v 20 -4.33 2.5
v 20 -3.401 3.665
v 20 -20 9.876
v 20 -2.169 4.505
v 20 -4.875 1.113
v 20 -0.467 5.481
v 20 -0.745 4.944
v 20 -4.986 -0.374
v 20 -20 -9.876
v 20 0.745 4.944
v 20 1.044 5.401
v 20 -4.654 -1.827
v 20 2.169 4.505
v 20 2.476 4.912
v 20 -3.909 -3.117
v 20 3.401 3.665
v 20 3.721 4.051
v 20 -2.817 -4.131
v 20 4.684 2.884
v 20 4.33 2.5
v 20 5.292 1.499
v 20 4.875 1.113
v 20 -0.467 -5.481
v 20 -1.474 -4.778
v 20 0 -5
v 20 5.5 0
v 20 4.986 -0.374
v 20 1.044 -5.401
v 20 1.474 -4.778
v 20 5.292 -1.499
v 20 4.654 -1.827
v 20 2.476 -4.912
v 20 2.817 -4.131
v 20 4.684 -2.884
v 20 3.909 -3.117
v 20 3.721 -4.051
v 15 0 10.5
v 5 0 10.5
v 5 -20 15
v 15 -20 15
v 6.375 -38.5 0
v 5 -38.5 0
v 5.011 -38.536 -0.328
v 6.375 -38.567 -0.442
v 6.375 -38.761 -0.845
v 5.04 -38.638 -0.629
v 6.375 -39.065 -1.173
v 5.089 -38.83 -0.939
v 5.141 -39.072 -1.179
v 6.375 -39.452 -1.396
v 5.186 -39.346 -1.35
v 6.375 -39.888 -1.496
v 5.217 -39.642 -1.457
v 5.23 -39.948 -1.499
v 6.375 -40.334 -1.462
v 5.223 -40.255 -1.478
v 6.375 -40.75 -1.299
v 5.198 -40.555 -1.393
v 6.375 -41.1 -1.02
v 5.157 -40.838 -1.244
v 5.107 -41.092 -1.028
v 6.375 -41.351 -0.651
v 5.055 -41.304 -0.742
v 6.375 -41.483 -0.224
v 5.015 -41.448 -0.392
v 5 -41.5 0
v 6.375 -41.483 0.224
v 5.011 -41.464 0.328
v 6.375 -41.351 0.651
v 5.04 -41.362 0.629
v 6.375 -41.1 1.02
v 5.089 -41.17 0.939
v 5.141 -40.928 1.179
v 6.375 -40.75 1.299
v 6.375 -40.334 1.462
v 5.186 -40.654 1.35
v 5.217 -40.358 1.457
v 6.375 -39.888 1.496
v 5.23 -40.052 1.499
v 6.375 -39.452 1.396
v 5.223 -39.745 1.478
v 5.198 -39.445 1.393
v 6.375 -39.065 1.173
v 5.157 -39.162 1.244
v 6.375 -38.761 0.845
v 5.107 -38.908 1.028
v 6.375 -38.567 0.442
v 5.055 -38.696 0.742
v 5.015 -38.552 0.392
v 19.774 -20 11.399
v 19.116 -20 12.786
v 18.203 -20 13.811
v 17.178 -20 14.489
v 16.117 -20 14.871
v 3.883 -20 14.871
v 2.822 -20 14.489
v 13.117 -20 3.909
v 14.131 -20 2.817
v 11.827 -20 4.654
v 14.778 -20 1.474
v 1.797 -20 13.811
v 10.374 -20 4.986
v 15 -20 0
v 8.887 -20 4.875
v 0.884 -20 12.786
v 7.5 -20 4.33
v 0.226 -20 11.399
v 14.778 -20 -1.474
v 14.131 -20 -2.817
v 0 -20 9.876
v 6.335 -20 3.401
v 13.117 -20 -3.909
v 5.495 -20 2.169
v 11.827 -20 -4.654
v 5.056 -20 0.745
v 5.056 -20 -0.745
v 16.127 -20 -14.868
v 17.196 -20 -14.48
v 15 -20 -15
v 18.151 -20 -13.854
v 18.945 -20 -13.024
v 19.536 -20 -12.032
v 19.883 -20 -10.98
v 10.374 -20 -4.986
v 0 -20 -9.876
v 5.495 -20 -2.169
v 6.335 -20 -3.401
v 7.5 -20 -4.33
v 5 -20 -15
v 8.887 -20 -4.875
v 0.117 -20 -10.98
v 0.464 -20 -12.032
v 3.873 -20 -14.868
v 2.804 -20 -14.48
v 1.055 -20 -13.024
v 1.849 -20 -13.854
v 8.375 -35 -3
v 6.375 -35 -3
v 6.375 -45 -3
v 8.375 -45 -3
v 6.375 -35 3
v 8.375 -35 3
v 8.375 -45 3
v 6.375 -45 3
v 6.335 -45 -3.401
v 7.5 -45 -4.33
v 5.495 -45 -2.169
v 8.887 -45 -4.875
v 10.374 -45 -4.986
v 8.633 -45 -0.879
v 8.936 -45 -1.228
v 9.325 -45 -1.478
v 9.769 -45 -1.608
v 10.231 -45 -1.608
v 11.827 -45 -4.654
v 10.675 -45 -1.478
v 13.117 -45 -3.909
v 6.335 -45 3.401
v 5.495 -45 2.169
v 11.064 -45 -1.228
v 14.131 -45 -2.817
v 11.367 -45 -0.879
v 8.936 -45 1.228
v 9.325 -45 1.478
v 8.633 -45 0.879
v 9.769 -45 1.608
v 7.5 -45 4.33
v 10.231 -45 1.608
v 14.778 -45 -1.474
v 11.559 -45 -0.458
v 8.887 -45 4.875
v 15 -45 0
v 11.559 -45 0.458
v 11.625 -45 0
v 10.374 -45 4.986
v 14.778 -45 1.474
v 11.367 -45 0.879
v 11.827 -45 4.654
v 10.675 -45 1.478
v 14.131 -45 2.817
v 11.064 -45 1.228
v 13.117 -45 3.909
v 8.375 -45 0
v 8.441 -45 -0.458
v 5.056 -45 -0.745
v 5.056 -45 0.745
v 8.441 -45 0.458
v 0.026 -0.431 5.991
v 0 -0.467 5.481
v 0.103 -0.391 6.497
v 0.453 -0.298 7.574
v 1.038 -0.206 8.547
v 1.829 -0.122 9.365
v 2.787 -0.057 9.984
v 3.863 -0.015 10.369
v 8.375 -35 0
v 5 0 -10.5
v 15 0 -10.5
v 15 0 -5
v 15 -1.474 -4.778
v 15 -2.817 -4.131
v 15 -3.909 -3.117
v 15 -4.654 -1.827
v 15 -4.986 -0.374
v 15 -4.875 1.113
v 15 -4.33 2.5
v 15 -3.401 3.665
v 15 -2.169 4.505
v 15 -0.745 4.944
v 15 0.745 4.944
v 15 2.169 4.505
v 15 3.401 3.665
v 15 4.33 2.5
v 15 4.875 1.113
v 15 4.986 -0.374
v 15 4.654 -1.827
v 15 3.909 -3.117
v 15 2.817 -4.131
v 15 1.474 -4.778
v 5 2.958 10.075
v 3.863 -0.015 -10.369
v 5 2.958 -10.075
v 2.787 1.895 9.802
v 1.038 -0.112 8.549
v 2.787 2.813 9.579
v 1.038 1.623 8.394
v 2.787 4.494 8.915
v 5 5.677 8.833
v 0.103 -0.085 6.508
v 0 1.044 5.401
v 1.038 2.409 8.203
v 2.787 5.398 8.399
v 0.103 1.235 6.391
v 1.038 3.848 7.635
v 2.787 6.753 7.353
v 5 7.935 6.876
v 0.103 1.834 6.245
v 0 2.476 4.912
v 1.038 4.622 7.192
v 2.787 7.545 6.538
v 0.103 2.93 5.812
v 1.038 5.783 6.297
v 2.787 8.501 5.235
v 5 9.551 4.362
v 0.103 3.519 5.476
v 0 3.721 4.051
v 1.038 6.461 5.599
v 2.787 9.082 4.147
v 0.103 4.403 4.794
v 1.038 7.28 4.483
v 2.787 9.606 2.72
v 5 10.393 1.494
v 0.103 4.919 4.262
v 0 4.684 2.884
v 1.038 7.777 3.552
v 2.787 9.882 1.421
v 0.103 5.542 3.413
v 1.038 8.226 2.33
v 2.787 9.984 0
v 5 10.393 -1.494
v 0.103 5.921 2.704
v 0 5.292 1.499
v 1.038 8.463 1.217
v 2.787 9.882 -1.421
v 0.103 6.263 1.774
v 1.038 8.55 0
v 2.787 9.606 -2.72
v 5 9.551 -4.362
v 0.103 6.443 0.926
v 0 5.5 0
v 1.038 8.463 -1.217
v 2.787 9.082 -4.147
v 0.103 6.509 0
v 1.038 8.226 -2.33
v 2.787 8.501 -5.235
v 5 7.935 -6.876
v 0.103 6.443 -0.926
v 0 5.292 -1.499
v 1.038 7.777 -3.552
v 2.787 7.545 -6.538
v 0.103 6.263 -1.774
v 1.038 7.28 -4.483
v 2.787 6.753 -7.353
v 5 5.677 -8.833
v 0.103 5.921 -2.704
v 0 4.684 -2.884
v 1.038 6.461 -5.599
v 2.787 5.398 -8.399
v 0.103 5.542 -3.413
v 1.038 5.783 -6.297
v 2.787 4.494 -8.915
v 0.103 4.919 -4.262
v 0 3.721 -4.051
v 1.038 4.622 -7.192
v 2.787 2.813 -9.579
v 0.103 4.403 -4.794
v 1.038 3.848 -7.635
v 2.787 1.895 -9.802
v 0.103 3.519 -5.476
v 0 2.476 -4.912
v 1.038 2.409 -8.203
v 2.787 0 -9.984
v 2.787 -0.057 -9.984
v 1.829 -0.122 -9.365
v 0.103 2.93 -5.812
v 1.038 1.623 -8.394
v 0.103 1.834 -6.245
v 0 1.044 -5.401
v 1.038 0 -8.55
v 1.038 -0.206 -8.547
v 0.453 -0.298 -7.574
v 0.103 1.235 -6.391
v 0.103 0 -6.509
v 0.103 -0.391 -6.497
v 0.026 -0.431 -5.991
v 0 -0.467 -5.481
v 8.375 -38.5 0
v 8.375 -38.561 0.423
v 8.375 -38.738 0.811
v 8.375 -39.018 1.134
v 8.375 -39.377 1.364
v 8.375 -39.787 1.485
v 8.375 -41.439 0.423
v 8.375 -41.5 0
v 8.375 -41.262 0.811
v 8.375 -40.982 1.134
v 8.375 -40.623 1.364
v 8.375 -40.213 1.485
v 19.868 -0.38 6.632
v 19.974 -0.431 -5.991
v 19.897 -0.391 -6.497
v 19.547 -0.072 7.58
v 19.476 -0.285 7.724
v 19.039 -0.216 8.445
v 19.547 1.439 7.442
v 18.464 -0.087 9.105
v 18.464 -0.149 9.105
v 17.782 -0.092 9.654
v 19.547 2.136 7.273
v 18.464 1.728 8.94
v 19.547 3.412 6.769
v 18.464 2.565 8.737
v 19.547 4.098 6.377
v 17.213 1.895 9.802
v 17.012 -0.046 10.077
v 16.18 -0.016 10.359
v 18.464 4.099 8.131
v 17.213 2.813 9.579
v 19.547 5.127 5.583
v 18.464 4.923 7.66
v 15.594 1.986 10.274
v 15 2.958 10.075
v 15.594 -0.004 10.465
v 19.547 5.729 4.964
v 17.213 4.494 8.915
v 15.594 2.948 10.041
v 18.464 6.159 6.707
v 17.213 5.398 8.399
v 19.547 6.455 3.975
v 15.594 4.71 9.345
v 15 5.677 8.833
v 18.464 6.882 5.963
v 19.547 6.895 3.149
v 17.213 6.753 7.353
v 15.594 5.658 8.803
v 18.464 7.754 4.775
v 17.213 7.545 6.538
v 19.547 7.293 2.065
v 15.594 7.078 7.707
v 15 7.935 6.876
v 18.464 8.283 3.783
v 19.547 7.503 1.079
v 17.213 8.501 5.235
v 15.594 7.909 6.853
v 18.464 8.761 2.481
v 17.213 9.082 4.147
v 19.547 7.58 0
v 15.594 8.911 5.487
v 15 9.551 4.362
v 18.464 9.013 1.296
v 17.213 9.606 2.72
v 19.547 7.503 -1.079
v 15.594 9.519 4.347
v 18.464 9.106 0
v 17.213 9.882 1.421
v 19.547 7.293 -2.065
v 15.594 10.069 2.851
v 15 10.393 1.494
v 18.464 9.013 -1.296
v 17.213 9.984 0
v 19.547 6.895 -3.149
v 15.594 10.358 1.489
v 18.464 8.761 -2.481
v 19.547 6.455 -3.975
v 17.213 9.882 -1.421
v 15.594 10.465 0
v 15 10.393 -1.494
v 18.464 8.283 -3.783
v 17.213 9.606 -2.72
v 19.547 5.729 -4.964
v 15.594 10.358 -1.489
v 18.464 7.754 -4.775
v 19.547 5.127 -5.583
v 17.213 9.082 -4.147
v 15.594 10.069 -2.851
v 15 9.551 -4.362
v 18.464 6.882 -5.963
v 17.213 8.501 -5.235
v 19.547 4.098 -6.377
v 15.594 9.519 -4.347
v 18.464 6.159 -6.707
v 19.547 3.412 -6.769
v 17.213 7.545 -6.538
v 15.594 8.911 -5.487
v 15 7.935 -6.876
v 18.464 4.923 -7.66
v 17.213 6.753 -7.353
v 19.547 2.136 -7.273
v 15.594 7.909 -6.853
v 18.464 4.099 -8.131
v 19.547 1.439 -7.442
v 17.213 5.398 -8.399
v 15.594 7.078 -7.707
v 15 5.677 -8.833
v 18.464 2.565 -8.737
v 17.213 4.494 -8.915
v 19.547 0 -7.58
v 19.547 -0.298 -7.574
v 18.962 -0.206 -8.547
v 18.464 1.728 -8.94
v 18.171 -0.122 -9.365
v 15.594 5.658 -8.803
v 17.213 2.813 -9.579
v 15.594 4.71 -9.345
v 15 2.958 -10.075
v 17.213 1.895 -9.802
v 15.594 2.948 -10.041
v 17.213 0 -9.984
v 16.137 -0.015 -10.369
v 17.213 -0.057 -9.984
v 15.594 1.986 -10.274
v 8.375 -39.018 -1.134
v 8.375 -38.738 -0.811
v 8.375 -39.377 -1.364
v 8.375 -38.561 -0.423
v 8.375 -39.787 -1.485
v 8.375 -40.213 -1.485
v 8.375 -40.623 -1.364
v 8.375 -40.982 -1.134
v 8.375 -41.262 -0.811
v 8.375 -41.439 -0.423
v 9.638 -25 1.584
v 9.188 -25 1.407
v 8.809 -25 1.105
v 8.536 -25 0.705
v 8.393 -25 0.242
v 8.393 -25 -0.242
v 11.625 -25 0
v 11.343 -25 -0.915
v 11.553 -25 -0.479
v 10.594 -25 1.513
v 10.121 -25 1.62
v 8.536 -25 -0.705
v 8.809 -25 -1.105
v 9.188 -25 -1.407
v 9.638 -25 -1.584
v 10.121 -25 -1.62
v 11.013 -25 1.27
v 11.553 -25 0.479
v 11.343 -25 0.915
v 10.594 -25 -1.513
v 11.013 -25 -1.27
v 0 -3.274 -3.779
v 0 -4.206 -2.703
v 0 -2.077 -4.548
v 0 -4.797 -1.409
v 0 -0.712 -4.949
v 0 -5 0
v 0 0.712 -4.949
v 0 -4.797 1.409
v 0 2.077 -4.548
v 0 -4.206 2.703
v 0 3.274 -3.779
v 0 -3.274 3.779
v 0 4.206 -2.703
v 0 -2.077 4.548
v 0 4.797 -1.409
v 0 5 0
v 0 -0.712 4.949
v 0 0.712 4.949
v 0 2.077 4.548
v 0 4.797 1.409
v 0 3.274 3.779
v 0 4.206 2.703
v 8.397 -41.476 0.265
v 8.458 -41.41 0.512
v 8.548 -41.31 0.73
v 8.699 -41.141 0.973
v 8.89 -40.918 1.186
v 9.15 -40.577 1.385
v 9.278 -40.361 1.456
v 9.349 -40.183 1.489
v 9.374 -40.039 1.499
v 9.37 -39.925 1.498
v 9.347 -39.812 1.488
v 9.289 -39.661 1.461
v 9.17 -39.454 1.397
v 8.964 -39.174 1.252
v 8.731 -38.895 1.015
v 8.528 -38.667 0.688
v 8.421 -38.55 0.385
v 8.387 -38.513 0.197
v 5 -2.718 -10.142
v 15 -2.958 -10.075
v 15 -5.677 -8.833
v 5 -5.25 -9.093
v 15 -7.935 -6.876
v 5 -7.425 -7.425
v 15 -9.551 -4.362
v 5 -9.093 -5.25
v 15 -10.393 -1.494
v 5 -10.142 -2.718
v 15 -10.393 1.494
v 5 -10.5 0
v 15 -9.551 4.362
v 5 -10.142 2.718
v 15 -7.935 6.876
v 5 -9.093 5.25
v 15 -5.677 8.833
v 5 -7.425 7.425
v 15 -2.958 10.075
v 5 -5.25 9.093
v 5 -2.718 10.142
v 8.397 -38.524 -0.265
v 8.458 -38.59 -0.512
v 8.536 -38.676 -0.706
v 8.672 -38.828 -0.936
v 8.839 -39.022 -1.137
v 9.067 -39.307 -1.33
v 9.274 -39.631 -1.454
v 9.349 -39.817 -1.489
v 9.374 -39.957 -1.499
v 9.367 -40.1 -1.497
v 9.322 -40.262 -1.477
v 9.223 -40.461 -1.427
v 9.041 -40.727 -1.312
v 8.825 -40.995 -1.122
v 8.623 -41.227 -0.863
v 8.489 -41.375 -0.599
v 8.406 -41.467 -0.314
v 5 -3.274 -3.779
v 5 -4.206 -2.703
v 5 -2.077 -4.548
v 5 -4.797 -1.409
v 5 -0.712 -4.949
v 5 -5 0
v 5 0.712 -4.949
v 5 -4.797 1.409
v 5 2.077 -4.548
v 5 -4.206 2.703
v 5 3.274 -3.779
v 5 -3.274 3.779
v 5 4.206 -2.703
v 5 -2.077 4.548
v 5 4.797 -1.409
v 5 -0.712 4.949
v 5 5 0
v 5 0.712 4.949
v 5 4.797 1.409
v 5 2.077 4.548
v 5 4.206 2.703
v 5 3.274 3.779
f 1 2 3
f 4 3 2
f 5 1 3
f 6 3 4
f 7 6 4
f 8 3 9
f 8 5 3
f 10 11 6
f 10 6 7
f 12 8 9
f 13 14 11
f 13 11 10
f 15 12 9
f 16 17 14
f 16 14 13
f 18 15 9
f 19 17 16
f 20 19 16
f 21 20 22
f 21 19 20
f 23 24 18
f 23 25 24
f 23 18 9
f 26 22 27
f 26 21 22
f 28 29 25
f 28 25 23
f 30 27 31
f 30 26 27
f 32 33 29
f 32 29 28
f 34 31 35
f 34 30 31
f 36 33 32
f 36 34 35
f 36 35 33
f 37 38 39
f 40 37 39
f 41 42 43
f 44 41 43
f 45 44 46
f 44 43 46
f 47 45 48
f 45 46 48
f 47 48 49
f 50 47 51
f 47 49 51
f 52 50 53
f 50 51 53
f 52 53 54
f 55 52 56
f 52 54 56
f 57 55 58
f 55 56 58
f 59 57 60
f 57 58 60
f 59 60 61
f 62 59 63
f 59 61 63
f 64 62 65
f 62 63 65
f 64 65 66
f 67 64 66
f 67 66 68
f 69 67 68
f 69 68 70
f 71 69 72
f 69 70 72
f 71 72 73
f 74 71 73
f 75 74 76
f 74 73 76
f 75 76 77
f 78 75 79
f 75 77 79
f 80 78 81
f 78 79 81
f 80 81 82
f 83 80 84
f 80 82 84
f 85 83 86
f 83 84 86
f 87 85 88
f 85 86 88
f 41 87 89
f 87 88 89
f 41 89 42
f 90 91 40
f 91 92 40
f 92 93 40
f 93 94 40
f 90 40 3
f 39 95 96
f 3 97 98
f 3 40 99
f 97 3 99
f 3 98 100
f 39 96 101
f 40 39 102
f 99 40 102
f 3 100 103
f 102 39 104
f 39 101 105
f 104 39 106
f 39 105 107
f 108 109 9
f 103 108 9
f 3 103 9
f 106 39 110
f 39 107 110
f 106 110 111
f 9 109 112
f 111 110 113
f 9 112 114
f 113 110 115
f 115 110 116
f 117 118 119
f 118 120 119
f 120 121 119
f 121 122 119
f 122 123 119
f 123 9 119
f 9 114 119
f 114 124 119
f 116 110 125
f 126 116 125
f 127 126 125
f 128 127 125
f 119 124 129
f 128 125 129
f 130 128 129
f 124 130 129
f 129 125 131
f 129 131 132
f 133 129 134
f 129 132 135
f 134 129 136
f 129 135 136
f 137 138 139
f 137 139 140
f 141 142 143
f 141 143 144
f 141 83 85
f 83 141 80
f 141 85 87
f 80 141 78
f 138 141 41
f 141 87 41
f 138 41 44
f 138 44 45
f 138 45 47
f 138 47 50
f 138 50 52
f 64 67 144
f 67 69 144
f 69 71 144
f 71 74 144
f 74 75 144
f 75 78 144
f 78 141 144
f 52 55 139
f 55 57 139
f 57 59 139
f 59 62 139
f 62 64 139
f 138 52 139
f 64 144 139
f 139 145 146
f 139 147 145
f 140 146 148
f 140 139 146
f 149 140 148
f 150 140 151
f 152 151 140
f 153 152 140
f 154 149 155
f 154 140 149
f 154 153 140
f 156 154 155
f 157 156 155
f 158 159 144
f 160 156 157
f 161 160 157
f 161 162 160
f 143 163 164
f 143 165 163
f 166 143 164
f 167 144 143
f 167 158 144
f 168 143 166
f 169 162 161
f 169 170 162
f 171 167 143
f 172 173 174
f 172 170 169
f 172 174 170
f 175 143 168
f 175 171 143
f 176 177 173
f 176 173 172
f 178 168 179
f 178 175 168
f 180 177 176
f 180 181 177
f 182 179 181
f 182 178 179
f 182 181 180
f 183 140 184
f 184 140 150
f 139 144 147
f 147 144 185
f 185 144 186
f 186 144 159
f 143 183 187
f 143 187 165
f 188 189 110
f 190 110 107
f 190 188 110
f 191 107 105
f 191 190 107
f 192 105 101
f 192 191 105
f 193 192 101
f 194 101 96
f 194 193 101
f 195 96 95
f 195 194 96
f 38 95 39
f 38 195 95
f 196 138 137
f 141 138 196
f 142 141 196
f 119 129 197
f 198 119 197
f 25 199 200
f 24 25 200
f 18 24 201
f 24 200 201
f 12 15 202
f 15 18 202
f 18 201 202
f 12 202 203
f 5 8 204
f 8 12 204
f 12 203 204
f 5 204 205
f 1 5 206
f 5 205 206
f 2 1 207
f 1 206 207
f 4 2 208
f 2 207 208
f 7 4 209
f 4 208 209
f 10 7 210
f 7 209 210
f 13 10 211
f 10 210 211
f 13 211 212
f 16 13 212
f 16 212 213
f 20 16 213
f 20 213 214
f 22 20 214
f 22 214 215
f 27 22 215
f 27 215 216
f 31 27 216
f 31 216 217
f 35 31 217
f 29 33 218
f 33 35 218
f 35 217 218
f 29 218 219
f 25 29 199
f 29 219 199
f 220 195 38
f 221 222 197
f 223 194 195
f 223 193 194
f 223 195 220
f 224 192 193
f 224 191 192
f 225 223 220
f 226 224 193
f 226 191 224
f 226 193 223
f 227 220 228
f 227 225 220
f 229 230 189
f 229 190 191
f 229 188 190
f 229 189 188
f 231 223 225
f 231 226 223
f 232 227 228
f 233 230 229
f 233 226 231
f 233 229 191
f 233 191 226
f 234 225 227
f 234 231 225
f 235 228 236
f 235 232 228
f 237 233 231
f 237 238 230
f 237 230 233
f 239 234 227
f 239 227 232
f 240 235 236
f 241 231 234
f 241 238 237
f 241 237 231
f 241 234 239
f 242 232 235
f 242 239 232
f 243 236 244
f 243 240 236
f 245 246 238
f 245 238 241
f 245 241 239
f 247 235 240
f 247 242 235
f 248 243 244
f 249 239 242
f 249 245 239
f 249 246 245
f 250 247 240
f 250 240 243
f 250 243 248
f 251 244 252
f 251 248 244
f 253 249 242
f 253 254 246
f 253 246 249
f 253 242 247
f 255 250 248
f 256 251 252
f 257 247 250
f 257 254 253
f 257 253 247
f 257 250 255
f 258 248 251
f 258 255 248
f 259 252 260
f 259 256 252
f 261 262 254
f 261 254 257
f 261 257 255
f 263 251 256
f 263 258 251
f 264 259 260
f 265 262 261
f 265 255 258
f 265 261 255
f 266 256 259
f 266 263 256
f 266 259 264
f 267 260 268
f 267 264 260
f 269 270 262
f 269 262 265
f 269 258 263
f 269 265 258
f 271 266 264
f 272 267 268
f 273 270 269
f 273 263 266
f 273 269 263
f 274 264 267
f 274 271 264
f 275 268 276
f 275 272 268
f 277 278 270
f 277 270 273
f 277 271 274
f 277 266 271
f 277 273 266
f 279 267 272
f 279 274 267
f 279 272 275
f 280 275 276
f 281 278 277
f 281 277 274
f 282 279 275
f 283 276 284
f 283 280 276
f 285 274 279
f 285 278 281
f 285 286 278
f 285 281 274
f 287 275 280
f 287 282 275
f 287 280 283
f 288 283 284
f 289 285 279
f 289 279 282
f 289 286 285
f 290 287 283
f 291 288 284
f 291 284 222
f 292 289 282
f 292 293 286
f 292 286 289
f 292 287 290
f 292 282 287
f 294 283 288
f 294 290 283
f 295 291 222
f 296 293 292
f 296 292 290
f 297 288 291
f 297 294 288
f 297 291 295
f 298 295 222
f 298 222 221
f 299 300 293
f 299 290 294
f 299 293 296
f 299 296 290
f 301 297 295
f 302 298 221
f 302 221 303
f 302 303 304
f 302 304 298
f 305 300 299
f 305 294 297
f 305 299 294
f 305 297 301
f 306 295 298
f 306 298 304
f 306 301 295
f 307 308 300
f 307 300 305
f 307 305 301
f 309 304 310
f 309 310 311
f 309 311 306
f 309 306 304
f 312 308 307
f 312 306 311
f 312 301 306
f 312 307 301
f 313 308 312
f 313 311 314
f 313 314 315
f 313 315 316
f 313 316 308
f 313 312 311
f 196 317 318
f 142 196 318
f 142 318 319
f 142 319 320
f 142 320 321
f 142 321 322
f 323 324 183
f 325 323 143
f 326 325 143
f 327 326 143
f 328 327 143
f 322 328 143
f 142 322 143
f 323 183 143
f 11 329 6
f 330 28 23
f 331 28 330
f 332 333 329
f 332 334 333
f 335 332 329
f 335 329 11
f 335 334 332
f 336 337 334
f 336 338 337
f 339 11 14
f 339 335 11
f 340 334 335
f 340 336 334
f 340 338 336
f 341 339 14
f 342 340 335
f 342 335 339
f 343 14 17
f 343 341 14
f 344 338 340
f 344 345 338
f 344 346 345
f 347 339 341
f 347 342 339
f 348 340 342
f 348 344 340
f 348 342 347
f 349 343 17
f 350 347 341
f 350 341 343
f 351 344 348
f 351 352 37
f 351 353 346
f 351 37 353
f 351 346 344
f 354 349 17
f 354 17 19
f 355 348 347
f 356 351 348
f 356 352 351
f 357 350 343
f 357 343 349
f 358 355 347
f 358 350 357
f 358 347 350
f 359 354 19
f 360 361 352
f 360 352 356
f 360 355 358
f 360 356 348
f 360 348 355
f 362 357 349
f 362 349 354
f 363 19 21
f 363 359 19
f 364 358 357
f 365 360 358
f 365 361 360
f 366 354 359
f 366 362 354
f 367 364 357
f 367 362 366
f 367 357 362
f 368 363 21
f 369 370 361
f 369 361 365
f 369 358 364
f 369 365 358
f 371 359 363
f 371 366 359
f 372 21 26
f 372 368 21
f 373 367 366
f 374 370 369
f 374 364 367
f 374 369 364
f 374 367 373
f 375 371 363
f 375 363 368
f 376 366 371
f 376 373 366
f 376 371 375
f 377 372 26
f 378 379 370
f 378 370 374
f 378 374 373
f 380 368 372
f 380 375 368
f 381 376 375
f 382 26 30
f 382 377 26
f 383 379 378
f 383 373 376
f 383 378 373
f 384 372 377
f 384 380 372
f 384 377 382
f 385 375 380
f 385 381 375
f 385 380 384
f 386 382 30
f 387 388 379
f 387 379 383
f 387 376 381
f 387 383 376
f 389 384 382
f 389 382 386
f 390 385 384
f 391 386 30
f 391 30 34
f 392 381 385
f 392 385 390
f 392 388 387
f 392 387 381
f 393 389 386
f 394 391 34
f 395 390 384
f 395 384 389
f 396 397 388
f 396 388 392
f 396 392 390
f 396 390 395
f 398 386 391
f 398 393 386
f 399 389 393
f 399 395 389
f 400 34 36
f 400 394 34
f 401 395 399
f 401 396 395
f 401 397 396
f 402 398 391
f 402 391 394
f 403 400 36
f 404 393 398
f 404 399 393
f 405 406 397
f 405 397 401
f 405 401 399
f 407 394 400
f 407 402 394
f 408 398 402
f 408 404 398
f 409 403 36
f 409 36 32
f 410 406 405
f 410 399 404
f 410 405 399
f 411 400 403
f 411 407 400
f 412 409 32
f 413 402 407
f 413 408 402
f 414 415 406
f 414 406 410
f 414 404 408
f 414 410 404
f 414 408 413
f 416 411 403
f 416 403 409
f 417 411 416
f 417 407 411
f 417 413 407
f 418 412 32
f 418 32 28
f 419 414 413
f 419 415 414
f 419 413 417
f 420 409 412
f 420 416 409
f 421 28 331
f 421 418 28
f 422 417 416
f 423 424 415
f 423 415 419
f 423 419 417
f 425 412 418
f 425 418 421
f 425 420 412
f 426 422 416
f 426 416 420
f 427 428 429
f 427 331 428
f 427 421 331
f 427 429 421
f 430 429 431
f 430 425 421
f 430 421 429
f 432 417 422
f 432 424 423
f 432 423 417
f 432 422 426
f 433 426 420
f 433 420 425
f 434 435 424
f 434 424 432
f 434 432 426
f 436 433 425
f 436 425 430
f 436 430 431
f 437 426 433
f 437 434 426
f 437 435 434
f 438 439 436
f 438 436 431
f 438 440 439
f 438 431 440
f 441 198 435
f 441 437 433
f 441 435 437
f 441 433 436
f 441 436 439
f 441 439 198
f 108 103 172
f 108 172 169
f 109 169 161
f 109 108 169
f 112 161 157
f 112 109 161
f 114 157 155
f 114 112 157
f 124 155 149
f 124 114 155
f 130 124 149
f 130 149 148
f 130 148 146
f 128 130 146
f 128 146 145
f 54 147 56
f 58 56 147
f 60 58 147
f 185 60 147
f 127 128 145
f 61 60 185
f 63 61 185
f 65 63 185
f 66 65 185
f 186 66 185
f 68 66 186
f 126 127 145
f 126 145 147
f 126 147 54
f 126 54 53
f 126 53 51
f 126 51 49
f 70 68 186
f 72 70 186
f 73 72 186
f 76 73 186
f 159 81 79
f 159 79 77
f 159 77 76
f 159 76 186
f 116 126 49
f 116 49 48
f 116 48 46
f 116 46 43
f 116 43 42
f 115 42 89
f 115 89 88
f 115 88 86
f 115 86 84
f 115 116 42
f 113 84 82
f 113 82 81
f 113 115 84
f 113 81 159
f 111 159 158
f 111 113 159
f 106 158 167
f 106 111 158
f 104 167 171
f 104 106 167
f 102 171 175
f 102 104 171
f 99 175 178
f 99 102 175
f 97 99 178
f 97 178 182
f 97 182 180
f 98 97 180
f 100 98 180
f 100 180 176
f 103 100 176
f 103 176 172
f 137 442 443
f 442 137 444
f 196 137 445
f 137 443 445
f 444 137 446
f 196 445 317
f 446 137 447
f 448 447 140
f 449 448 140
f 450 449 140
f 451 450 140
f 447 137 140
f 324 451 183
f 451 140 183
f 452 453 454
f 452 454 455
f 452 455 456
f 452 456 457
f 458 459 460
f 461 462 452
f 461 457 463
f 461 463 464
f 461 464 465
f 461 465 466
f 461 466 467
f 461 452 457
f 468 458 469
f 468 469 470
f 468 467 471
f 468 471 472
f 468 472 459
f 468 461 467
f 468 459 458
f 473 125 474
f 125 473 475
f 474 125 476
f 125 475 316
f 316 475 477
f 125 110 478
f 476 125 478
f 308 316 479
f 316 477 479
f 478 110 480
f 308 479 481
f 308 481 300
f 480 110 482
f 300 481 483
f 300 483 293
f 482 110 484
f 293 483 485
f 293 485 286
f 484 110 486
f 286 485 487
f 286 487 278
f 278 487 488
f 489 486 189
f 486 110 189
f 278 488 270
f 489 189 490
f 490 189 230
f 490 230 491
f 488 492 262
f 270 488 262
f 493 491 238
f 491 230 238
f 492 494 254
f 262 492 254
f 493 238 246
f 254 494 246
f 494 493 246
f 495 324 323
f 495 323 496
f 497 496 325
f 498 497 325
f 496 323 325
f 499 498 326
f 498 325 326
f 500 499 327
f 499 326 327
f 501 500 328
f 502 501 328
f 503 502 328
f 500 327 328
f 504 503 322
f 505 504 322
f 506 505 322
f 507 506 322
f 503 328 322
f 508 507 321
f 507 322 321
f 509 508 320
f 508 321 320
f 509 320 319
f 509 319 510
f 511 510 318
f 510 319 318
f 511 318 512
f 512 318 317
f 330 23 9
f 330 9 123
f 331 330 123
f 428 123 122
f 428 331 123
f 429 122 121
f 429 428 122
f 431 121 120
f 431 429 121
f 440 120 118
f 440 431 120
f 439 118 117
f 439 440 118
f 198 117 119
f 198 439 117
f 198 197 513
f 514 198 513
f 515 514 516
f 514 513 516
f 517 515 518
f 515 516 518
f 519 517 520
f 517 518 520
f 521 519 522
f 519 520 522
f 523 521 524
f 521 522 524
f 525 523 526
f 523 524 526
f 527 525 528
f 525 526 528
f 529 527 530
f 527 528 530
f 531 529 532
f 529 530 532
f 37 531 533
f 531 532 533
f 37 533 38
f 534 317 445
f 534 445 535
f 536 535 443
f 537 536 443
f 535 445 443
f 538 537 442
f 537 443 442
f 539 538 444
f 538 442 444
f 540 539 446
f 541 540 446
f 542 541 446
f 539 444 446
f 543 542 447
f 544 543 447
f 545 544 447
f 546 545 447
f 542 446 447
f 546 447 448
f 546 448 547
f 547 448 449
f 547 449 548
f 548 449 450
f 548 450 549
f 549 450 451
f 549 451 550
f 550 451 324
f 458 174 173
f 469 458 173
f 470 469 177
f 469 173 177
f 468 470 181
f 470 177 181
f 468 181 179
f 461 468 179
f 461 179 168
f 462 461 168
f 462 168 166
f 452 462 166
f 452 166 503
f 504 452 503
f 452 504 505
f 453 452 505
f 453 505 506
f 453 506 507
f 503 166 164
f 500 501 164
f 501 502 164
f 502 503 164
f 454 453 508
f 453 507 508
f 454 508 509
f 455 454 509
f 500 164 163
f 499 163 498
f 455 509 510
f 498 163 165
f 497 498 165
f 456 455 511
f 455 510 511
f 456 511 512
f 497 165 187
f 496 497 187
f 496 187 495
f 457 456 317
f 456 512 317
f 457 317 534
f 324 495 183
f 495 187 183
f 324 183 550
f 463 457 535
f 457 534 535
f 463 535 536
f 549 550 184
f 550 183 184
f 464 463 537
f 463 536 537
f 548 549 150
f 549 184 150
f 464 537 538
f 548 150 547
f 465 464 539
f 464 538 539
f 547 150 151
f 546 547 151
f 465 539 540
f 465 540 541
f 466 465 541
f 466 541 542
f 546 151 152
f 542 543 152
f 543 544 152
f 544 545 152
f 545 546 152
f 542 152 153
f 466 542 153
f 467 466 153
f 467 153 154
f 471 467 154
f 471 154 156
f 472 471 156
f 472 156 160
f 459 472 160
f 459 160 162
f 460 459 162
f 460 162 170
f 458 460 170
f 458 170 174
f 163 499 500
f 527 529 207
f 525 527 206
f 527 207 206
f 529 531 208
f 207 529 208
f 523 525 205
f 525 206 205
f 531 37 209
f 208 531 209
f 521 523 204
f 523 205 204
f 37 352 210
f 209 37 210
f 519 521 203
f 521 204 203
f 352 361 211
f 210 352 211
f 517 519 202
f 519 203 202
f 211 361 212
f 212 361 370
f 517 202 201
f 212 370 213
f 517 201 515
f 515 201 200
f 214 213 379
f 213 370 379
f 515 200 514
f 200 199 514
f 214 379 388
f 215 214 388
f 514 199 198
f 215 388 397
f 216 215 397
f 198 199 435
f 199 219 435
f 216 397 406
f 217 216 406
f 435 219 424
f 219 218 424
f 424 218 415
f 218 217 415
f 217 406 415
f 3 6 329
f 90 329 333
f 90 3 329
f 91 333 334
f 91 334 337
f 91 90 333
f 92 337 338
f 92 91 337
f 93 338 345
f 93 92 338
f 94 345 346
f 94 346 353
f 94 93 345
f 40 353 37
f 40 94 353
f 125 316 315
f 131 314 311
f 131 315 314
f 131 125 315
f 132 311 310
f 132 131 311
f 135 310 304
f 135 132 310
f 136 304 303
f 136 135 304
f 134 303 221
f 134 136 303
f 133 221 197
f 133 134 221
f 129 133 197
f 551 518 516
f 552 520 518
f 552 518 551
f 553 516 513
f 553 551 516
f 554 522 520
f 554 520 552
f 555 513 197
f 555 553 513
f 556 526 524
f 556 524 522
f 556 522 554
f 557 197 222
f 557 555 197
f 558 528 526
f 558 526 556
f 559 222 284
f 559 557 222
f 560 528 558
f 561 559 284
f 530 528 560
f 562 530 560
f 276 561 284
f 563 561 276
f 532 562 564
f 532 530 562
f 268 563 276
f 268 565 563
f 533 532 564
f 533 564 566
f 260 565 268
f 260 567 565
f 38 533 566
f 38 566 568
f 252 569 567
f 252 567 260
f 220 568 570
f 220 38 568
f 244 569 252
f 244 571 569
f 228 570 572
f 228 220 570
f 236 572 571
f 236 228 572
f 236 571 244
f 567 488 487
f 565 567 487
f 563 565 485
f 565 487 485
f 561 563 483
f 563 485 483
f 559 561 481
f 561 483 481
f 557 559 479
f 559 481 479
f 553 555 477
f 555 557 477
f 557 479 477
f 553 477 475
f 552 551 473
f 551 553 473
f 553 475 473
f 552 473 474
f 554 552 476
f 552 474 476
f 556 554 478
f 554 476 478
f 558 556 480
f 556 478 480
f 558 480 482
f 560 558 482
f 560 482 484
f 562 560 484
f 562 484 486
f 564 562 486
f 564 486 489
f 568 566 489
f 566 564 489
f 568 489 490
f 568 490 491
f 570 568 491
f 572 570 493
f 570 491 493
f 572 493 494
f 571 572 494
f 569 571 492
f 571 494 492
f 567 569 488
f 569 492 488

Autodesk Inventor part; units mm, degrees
ref_plane "YZ Plane" through (0, 0, 0) normal (1, 0, 0) x (0, 1, 0)
ref_plane "XZ Plane" through (0, 0, 0) normal (0, 1, 0) x (-1, 0, 0)
ref_plane "XY Plane" through (0, 0, 0) normal (0, 0, 1) x (1, 0, 0)
sketch "Sketch1" plane through (0, 0, 0) normal (1, 0, 0) x (0, 1, 0)
  circle A0 centre (0, 0) radius 5
  circle A1 centre (0, 0) radius 10.5
  line L0 (0, 0) -> (-20, 0)
  line L1 (-20, 0) -> (-20, -15)
  line L2 (-20, -15) -> (-20, 15)
  line L3 (-20, 15) -> (0, 10.5)
  line L4 (0, -10.5) -> (-20, -15)
  dimension "d0" = 10
  dimension "d1" = 21
  dimension "d2" = 20
  dimension "d3" = 15
  dimension "d4" = 30
extrude "Extrusion1" add sketch "Sketch1" along normal blind 5
sketch "Sketch2" plane through (5, 0, 0) normal (1, 0, 0) x (0, 0, -1)
  arc A0 (10.5, 0) -> (-10.5, 0) centre (0, 0) ccw projected
  circle A1 centre (0, 0) radius 10.5
  line L0 (-10.5, 0) -> (-15, -20) projected
  line L1 (-10.5, 0) -> (-15, -20)
  line L2 (15, -20) -> (10.5, 0) projected
  line L3 (-15, -20) -> (15, -20)
  line L4 (15, -20) -> (10.5, 0)
  point P0 (-10.5, 0)
extrude "Extrusion2" add sketch "Sketch2" along normal blind 10 contours L2 L3 L0 A1
sketch "Sketch4" plane through (15, 0, 0) normal (1, 0, 0) x (0, 0, -1)
  circle A0 centre (0, 0) radius 5
  circle A1 centre (0, 0) radius 10.5
  line L0 (15, -20) -> (10.5, 0) projected
  line L1 (10.5, 0) -> (15, -20)
  line L2 (-15, -20) -> (15, -20) projected
  line L3 (15, -20) -> (-15, -20)
  line L4 (-10.5, 0) -> (-15, -20) projected
  line L5 (-15, -20) -> (-10.5, 0)
extrude "Extrusion3" add sketch "Sketch4" along normal blind 5
sketch "Sketch5" plane through (0, -20, -15) normal (0, -1, 0) x (1, 0, 0)
  line L0 (20, 4.5) -> (20, 25.5) projected
  line L1 (20, 15) -> (0, 15)
  circle A0 centre (10, 15) radius 5
  dimension "d11" = 10
extrude "Extrusion4" add sketch "Sketch5" along normal blind 25
fillet "Fillet1" radius 5 6 edges at (20, -10, 12.75) (20, -10, -12.75) (20, 10.5, 0) (0, 10.5, 0) (0, -10, -12.75) (0, -10, 12.75)
sketch "Sketch6" plane through (10, -45, 0) normal (0, -1, 0) x (1, 0, 0)
  circle A0 centre (0, 0) radius 5 projected
  circle A1 centre (0, 0) radius 1.625
  point P0 (-10, 0)
  dimension "d15" = 3.25
extrude "Extrusion5" cut sketch "Sketch6" against normal blind 20 contours A1
sketch "Sketch7" plane through (0, 0, 0) normal (1, 0, 0) x (0, 1, 0)
  line L0 (-45, 5) -> (-45, -5) projected
  line L1 (-45, 0) -> (-40, 0)
  circle A0 centre (-40, 0) radius 1.5
  point P0 (0, 0)
  dimension "d18" = 5
  dimension "d19" = 3
extrude "Extrusion6" cut sketch "Sketch7" along normal blind 10
sketch "Sketch8" plane through (10, -45, 0) normal (0, -1, 0) x (1, 0, 0)
  circle A0 centre (0, 0) radius 1.625 projected
  line L0 (-1.625, 0) -> (-1.625, 3)
  line L1 (-1.625, 3) -> (-3.625, 3)
  line L2 (-3.625, 3) -> (-3.625, -3)
  line L3 (-3.625, -3) -> (-1.625, -3)
  line L4 (-1.625, -3) -> (-1.625, 0)
  point P0 (-10, 0)
  dimension "d22" = 3
  dimension "d23" = 2
  dimension "d24" = 6
extrude "Extrusion7" cut sketch "Sketch8" against normal blind 10 contours L4 L3 L2 L1 L0
properties part number "wrist"
